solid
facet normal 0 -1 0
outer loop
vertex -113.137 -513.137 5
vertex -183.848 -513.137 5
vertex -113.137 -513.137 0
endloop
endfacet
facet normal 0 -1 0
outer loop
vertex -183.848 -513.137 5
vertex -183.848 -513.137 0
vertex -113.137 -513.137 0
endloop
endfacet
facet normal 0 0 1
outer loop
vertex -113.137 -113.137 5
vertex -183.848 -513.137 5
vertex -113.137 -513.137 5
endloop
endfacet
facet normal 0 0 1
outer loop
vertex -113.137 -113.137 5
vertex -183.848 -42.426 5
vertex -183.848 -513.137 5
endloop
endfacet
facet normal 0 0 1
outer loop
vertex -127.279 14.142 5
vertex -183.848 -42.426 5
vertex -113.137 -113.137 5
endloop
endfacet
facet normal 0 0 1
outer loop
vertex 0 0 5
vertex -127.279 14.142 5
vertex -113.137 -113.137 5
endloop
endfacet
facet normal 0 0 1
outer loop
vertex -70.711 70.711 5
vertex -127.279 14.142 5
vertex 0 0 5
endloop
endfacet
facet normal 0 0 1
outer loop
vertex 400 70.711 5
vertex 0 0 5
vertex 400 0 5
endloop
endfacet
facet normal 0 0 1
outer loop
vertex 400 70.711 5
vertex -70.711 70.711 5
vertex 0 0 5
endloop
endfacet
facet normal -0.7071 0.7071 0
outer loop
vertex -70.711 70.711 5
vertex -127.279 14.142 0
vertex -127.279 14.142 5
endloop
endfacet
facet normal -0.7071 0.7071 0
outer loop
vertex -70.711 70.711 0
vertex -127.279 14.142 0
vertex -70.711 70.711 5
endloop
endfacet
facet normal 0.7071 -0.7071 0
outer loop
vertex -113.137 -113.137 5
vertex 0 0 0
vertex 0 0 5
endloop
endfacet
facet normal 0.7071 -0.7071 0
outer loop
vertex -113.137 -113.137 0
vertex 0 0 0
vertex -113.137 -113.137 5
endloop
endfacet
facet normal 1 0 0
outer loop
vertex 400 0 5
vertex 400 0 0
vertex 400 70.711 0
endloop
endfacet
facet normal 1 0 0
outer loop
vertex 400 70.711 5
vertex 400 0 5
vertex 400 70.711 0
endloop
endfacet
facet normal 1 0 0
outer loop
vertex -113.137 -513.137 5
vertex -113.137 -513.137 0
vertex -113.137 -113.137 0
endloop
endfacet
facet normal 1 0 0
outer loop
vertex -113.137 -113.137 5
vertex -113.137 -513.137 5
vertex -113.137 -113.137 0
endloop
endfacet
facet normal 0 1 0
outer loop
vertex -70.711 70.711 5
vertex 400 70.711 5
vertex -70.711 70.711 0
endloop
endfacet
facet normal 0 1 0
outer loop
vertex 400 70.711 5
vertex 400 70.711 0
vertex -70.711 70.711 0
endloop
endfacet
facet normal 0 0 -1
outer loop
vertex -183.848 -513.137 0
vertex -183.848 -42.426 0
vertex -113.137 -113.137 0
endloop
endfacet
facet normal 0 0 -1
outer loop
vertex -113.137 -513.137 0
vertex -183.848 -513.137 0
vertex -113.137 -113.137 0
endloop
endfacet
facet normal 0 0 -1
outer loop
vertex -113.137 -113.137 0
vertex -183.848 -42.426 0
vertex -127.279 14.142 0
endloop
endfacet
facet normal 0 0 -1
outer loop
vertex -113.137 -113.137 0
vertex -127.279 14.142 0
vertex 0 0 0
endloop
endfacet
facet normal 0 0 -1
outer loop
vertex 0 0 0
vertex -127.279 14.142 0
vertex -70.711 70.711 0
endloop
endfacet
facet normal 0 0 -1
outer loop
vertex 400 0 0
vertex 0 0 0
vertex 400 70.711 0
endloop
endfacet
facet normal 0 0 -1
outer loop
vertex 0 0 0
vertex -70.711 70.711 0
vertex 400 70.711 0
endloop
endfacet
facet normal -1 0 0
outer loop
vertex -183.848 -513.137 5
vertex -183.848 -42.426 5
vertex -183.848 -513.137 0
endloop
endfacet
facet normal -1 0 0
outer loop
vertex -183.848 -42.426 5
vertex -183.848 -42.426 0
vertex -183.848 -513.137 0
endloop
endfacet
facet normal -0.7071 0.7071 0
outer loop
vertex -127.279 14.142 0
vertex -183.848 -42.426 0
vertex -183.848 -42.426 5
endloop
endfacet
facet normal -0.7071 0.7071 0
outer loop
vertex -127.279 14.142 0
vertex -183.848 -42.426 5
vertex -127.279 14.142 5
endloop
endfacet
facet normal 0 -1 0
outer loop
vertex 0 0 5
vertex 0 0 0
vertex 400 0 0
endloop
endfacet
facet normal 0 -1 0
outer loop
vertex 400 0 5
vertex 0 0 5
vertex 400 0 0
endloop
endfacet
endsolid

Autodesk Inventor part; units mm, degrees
ref_plane "YZ Plane" through (0, 0, 0) normal (1, 0, 0) x (0, 1, 0)
ref_plane "XZ Plane" through (0, 0, 0) normal (0, 1, 0) x (-1, 0, 0)
ref_plane "XY Plane" through (0, 0, 0) normal (0, 0, 1) x (1, 0, 0)
sketch "Sketch1" plane through (0, 0, 0) normal (0, 0, 1) x (1, 0, 0)
  line L0 (0, 0) -> (400, 0)
  line L1 (400, 0) -> (400, 70.7107)
  line L2 (400, 70.7107) -> (-70.7107, 70.7107)
  line L3 (-70.7107, 70.7107) -> (0, 0) construction
  line L4 (0, 0) -> (-56.5685, -56.5685)
  line L5 (-56.5685, -56.5685) -> (-127.2792, 14.1421)
  line L6 (-127.2792, 14.1421) -> (-70.7107, 70.7107)
  dimension "d0" = 400
  dimension "d2" = 135
  dimension "d3" = 80
  dimension "d6" = 100
extrude "Extrusion1" add sketch "Sketch1" along normal blind 5
mirror "Mirror1" about plane through (-127.2792, 14.1421, 0) normal (-0.7071068, -0.7071068, 0)
properties part number "leg" material "Plywood, Finish"
